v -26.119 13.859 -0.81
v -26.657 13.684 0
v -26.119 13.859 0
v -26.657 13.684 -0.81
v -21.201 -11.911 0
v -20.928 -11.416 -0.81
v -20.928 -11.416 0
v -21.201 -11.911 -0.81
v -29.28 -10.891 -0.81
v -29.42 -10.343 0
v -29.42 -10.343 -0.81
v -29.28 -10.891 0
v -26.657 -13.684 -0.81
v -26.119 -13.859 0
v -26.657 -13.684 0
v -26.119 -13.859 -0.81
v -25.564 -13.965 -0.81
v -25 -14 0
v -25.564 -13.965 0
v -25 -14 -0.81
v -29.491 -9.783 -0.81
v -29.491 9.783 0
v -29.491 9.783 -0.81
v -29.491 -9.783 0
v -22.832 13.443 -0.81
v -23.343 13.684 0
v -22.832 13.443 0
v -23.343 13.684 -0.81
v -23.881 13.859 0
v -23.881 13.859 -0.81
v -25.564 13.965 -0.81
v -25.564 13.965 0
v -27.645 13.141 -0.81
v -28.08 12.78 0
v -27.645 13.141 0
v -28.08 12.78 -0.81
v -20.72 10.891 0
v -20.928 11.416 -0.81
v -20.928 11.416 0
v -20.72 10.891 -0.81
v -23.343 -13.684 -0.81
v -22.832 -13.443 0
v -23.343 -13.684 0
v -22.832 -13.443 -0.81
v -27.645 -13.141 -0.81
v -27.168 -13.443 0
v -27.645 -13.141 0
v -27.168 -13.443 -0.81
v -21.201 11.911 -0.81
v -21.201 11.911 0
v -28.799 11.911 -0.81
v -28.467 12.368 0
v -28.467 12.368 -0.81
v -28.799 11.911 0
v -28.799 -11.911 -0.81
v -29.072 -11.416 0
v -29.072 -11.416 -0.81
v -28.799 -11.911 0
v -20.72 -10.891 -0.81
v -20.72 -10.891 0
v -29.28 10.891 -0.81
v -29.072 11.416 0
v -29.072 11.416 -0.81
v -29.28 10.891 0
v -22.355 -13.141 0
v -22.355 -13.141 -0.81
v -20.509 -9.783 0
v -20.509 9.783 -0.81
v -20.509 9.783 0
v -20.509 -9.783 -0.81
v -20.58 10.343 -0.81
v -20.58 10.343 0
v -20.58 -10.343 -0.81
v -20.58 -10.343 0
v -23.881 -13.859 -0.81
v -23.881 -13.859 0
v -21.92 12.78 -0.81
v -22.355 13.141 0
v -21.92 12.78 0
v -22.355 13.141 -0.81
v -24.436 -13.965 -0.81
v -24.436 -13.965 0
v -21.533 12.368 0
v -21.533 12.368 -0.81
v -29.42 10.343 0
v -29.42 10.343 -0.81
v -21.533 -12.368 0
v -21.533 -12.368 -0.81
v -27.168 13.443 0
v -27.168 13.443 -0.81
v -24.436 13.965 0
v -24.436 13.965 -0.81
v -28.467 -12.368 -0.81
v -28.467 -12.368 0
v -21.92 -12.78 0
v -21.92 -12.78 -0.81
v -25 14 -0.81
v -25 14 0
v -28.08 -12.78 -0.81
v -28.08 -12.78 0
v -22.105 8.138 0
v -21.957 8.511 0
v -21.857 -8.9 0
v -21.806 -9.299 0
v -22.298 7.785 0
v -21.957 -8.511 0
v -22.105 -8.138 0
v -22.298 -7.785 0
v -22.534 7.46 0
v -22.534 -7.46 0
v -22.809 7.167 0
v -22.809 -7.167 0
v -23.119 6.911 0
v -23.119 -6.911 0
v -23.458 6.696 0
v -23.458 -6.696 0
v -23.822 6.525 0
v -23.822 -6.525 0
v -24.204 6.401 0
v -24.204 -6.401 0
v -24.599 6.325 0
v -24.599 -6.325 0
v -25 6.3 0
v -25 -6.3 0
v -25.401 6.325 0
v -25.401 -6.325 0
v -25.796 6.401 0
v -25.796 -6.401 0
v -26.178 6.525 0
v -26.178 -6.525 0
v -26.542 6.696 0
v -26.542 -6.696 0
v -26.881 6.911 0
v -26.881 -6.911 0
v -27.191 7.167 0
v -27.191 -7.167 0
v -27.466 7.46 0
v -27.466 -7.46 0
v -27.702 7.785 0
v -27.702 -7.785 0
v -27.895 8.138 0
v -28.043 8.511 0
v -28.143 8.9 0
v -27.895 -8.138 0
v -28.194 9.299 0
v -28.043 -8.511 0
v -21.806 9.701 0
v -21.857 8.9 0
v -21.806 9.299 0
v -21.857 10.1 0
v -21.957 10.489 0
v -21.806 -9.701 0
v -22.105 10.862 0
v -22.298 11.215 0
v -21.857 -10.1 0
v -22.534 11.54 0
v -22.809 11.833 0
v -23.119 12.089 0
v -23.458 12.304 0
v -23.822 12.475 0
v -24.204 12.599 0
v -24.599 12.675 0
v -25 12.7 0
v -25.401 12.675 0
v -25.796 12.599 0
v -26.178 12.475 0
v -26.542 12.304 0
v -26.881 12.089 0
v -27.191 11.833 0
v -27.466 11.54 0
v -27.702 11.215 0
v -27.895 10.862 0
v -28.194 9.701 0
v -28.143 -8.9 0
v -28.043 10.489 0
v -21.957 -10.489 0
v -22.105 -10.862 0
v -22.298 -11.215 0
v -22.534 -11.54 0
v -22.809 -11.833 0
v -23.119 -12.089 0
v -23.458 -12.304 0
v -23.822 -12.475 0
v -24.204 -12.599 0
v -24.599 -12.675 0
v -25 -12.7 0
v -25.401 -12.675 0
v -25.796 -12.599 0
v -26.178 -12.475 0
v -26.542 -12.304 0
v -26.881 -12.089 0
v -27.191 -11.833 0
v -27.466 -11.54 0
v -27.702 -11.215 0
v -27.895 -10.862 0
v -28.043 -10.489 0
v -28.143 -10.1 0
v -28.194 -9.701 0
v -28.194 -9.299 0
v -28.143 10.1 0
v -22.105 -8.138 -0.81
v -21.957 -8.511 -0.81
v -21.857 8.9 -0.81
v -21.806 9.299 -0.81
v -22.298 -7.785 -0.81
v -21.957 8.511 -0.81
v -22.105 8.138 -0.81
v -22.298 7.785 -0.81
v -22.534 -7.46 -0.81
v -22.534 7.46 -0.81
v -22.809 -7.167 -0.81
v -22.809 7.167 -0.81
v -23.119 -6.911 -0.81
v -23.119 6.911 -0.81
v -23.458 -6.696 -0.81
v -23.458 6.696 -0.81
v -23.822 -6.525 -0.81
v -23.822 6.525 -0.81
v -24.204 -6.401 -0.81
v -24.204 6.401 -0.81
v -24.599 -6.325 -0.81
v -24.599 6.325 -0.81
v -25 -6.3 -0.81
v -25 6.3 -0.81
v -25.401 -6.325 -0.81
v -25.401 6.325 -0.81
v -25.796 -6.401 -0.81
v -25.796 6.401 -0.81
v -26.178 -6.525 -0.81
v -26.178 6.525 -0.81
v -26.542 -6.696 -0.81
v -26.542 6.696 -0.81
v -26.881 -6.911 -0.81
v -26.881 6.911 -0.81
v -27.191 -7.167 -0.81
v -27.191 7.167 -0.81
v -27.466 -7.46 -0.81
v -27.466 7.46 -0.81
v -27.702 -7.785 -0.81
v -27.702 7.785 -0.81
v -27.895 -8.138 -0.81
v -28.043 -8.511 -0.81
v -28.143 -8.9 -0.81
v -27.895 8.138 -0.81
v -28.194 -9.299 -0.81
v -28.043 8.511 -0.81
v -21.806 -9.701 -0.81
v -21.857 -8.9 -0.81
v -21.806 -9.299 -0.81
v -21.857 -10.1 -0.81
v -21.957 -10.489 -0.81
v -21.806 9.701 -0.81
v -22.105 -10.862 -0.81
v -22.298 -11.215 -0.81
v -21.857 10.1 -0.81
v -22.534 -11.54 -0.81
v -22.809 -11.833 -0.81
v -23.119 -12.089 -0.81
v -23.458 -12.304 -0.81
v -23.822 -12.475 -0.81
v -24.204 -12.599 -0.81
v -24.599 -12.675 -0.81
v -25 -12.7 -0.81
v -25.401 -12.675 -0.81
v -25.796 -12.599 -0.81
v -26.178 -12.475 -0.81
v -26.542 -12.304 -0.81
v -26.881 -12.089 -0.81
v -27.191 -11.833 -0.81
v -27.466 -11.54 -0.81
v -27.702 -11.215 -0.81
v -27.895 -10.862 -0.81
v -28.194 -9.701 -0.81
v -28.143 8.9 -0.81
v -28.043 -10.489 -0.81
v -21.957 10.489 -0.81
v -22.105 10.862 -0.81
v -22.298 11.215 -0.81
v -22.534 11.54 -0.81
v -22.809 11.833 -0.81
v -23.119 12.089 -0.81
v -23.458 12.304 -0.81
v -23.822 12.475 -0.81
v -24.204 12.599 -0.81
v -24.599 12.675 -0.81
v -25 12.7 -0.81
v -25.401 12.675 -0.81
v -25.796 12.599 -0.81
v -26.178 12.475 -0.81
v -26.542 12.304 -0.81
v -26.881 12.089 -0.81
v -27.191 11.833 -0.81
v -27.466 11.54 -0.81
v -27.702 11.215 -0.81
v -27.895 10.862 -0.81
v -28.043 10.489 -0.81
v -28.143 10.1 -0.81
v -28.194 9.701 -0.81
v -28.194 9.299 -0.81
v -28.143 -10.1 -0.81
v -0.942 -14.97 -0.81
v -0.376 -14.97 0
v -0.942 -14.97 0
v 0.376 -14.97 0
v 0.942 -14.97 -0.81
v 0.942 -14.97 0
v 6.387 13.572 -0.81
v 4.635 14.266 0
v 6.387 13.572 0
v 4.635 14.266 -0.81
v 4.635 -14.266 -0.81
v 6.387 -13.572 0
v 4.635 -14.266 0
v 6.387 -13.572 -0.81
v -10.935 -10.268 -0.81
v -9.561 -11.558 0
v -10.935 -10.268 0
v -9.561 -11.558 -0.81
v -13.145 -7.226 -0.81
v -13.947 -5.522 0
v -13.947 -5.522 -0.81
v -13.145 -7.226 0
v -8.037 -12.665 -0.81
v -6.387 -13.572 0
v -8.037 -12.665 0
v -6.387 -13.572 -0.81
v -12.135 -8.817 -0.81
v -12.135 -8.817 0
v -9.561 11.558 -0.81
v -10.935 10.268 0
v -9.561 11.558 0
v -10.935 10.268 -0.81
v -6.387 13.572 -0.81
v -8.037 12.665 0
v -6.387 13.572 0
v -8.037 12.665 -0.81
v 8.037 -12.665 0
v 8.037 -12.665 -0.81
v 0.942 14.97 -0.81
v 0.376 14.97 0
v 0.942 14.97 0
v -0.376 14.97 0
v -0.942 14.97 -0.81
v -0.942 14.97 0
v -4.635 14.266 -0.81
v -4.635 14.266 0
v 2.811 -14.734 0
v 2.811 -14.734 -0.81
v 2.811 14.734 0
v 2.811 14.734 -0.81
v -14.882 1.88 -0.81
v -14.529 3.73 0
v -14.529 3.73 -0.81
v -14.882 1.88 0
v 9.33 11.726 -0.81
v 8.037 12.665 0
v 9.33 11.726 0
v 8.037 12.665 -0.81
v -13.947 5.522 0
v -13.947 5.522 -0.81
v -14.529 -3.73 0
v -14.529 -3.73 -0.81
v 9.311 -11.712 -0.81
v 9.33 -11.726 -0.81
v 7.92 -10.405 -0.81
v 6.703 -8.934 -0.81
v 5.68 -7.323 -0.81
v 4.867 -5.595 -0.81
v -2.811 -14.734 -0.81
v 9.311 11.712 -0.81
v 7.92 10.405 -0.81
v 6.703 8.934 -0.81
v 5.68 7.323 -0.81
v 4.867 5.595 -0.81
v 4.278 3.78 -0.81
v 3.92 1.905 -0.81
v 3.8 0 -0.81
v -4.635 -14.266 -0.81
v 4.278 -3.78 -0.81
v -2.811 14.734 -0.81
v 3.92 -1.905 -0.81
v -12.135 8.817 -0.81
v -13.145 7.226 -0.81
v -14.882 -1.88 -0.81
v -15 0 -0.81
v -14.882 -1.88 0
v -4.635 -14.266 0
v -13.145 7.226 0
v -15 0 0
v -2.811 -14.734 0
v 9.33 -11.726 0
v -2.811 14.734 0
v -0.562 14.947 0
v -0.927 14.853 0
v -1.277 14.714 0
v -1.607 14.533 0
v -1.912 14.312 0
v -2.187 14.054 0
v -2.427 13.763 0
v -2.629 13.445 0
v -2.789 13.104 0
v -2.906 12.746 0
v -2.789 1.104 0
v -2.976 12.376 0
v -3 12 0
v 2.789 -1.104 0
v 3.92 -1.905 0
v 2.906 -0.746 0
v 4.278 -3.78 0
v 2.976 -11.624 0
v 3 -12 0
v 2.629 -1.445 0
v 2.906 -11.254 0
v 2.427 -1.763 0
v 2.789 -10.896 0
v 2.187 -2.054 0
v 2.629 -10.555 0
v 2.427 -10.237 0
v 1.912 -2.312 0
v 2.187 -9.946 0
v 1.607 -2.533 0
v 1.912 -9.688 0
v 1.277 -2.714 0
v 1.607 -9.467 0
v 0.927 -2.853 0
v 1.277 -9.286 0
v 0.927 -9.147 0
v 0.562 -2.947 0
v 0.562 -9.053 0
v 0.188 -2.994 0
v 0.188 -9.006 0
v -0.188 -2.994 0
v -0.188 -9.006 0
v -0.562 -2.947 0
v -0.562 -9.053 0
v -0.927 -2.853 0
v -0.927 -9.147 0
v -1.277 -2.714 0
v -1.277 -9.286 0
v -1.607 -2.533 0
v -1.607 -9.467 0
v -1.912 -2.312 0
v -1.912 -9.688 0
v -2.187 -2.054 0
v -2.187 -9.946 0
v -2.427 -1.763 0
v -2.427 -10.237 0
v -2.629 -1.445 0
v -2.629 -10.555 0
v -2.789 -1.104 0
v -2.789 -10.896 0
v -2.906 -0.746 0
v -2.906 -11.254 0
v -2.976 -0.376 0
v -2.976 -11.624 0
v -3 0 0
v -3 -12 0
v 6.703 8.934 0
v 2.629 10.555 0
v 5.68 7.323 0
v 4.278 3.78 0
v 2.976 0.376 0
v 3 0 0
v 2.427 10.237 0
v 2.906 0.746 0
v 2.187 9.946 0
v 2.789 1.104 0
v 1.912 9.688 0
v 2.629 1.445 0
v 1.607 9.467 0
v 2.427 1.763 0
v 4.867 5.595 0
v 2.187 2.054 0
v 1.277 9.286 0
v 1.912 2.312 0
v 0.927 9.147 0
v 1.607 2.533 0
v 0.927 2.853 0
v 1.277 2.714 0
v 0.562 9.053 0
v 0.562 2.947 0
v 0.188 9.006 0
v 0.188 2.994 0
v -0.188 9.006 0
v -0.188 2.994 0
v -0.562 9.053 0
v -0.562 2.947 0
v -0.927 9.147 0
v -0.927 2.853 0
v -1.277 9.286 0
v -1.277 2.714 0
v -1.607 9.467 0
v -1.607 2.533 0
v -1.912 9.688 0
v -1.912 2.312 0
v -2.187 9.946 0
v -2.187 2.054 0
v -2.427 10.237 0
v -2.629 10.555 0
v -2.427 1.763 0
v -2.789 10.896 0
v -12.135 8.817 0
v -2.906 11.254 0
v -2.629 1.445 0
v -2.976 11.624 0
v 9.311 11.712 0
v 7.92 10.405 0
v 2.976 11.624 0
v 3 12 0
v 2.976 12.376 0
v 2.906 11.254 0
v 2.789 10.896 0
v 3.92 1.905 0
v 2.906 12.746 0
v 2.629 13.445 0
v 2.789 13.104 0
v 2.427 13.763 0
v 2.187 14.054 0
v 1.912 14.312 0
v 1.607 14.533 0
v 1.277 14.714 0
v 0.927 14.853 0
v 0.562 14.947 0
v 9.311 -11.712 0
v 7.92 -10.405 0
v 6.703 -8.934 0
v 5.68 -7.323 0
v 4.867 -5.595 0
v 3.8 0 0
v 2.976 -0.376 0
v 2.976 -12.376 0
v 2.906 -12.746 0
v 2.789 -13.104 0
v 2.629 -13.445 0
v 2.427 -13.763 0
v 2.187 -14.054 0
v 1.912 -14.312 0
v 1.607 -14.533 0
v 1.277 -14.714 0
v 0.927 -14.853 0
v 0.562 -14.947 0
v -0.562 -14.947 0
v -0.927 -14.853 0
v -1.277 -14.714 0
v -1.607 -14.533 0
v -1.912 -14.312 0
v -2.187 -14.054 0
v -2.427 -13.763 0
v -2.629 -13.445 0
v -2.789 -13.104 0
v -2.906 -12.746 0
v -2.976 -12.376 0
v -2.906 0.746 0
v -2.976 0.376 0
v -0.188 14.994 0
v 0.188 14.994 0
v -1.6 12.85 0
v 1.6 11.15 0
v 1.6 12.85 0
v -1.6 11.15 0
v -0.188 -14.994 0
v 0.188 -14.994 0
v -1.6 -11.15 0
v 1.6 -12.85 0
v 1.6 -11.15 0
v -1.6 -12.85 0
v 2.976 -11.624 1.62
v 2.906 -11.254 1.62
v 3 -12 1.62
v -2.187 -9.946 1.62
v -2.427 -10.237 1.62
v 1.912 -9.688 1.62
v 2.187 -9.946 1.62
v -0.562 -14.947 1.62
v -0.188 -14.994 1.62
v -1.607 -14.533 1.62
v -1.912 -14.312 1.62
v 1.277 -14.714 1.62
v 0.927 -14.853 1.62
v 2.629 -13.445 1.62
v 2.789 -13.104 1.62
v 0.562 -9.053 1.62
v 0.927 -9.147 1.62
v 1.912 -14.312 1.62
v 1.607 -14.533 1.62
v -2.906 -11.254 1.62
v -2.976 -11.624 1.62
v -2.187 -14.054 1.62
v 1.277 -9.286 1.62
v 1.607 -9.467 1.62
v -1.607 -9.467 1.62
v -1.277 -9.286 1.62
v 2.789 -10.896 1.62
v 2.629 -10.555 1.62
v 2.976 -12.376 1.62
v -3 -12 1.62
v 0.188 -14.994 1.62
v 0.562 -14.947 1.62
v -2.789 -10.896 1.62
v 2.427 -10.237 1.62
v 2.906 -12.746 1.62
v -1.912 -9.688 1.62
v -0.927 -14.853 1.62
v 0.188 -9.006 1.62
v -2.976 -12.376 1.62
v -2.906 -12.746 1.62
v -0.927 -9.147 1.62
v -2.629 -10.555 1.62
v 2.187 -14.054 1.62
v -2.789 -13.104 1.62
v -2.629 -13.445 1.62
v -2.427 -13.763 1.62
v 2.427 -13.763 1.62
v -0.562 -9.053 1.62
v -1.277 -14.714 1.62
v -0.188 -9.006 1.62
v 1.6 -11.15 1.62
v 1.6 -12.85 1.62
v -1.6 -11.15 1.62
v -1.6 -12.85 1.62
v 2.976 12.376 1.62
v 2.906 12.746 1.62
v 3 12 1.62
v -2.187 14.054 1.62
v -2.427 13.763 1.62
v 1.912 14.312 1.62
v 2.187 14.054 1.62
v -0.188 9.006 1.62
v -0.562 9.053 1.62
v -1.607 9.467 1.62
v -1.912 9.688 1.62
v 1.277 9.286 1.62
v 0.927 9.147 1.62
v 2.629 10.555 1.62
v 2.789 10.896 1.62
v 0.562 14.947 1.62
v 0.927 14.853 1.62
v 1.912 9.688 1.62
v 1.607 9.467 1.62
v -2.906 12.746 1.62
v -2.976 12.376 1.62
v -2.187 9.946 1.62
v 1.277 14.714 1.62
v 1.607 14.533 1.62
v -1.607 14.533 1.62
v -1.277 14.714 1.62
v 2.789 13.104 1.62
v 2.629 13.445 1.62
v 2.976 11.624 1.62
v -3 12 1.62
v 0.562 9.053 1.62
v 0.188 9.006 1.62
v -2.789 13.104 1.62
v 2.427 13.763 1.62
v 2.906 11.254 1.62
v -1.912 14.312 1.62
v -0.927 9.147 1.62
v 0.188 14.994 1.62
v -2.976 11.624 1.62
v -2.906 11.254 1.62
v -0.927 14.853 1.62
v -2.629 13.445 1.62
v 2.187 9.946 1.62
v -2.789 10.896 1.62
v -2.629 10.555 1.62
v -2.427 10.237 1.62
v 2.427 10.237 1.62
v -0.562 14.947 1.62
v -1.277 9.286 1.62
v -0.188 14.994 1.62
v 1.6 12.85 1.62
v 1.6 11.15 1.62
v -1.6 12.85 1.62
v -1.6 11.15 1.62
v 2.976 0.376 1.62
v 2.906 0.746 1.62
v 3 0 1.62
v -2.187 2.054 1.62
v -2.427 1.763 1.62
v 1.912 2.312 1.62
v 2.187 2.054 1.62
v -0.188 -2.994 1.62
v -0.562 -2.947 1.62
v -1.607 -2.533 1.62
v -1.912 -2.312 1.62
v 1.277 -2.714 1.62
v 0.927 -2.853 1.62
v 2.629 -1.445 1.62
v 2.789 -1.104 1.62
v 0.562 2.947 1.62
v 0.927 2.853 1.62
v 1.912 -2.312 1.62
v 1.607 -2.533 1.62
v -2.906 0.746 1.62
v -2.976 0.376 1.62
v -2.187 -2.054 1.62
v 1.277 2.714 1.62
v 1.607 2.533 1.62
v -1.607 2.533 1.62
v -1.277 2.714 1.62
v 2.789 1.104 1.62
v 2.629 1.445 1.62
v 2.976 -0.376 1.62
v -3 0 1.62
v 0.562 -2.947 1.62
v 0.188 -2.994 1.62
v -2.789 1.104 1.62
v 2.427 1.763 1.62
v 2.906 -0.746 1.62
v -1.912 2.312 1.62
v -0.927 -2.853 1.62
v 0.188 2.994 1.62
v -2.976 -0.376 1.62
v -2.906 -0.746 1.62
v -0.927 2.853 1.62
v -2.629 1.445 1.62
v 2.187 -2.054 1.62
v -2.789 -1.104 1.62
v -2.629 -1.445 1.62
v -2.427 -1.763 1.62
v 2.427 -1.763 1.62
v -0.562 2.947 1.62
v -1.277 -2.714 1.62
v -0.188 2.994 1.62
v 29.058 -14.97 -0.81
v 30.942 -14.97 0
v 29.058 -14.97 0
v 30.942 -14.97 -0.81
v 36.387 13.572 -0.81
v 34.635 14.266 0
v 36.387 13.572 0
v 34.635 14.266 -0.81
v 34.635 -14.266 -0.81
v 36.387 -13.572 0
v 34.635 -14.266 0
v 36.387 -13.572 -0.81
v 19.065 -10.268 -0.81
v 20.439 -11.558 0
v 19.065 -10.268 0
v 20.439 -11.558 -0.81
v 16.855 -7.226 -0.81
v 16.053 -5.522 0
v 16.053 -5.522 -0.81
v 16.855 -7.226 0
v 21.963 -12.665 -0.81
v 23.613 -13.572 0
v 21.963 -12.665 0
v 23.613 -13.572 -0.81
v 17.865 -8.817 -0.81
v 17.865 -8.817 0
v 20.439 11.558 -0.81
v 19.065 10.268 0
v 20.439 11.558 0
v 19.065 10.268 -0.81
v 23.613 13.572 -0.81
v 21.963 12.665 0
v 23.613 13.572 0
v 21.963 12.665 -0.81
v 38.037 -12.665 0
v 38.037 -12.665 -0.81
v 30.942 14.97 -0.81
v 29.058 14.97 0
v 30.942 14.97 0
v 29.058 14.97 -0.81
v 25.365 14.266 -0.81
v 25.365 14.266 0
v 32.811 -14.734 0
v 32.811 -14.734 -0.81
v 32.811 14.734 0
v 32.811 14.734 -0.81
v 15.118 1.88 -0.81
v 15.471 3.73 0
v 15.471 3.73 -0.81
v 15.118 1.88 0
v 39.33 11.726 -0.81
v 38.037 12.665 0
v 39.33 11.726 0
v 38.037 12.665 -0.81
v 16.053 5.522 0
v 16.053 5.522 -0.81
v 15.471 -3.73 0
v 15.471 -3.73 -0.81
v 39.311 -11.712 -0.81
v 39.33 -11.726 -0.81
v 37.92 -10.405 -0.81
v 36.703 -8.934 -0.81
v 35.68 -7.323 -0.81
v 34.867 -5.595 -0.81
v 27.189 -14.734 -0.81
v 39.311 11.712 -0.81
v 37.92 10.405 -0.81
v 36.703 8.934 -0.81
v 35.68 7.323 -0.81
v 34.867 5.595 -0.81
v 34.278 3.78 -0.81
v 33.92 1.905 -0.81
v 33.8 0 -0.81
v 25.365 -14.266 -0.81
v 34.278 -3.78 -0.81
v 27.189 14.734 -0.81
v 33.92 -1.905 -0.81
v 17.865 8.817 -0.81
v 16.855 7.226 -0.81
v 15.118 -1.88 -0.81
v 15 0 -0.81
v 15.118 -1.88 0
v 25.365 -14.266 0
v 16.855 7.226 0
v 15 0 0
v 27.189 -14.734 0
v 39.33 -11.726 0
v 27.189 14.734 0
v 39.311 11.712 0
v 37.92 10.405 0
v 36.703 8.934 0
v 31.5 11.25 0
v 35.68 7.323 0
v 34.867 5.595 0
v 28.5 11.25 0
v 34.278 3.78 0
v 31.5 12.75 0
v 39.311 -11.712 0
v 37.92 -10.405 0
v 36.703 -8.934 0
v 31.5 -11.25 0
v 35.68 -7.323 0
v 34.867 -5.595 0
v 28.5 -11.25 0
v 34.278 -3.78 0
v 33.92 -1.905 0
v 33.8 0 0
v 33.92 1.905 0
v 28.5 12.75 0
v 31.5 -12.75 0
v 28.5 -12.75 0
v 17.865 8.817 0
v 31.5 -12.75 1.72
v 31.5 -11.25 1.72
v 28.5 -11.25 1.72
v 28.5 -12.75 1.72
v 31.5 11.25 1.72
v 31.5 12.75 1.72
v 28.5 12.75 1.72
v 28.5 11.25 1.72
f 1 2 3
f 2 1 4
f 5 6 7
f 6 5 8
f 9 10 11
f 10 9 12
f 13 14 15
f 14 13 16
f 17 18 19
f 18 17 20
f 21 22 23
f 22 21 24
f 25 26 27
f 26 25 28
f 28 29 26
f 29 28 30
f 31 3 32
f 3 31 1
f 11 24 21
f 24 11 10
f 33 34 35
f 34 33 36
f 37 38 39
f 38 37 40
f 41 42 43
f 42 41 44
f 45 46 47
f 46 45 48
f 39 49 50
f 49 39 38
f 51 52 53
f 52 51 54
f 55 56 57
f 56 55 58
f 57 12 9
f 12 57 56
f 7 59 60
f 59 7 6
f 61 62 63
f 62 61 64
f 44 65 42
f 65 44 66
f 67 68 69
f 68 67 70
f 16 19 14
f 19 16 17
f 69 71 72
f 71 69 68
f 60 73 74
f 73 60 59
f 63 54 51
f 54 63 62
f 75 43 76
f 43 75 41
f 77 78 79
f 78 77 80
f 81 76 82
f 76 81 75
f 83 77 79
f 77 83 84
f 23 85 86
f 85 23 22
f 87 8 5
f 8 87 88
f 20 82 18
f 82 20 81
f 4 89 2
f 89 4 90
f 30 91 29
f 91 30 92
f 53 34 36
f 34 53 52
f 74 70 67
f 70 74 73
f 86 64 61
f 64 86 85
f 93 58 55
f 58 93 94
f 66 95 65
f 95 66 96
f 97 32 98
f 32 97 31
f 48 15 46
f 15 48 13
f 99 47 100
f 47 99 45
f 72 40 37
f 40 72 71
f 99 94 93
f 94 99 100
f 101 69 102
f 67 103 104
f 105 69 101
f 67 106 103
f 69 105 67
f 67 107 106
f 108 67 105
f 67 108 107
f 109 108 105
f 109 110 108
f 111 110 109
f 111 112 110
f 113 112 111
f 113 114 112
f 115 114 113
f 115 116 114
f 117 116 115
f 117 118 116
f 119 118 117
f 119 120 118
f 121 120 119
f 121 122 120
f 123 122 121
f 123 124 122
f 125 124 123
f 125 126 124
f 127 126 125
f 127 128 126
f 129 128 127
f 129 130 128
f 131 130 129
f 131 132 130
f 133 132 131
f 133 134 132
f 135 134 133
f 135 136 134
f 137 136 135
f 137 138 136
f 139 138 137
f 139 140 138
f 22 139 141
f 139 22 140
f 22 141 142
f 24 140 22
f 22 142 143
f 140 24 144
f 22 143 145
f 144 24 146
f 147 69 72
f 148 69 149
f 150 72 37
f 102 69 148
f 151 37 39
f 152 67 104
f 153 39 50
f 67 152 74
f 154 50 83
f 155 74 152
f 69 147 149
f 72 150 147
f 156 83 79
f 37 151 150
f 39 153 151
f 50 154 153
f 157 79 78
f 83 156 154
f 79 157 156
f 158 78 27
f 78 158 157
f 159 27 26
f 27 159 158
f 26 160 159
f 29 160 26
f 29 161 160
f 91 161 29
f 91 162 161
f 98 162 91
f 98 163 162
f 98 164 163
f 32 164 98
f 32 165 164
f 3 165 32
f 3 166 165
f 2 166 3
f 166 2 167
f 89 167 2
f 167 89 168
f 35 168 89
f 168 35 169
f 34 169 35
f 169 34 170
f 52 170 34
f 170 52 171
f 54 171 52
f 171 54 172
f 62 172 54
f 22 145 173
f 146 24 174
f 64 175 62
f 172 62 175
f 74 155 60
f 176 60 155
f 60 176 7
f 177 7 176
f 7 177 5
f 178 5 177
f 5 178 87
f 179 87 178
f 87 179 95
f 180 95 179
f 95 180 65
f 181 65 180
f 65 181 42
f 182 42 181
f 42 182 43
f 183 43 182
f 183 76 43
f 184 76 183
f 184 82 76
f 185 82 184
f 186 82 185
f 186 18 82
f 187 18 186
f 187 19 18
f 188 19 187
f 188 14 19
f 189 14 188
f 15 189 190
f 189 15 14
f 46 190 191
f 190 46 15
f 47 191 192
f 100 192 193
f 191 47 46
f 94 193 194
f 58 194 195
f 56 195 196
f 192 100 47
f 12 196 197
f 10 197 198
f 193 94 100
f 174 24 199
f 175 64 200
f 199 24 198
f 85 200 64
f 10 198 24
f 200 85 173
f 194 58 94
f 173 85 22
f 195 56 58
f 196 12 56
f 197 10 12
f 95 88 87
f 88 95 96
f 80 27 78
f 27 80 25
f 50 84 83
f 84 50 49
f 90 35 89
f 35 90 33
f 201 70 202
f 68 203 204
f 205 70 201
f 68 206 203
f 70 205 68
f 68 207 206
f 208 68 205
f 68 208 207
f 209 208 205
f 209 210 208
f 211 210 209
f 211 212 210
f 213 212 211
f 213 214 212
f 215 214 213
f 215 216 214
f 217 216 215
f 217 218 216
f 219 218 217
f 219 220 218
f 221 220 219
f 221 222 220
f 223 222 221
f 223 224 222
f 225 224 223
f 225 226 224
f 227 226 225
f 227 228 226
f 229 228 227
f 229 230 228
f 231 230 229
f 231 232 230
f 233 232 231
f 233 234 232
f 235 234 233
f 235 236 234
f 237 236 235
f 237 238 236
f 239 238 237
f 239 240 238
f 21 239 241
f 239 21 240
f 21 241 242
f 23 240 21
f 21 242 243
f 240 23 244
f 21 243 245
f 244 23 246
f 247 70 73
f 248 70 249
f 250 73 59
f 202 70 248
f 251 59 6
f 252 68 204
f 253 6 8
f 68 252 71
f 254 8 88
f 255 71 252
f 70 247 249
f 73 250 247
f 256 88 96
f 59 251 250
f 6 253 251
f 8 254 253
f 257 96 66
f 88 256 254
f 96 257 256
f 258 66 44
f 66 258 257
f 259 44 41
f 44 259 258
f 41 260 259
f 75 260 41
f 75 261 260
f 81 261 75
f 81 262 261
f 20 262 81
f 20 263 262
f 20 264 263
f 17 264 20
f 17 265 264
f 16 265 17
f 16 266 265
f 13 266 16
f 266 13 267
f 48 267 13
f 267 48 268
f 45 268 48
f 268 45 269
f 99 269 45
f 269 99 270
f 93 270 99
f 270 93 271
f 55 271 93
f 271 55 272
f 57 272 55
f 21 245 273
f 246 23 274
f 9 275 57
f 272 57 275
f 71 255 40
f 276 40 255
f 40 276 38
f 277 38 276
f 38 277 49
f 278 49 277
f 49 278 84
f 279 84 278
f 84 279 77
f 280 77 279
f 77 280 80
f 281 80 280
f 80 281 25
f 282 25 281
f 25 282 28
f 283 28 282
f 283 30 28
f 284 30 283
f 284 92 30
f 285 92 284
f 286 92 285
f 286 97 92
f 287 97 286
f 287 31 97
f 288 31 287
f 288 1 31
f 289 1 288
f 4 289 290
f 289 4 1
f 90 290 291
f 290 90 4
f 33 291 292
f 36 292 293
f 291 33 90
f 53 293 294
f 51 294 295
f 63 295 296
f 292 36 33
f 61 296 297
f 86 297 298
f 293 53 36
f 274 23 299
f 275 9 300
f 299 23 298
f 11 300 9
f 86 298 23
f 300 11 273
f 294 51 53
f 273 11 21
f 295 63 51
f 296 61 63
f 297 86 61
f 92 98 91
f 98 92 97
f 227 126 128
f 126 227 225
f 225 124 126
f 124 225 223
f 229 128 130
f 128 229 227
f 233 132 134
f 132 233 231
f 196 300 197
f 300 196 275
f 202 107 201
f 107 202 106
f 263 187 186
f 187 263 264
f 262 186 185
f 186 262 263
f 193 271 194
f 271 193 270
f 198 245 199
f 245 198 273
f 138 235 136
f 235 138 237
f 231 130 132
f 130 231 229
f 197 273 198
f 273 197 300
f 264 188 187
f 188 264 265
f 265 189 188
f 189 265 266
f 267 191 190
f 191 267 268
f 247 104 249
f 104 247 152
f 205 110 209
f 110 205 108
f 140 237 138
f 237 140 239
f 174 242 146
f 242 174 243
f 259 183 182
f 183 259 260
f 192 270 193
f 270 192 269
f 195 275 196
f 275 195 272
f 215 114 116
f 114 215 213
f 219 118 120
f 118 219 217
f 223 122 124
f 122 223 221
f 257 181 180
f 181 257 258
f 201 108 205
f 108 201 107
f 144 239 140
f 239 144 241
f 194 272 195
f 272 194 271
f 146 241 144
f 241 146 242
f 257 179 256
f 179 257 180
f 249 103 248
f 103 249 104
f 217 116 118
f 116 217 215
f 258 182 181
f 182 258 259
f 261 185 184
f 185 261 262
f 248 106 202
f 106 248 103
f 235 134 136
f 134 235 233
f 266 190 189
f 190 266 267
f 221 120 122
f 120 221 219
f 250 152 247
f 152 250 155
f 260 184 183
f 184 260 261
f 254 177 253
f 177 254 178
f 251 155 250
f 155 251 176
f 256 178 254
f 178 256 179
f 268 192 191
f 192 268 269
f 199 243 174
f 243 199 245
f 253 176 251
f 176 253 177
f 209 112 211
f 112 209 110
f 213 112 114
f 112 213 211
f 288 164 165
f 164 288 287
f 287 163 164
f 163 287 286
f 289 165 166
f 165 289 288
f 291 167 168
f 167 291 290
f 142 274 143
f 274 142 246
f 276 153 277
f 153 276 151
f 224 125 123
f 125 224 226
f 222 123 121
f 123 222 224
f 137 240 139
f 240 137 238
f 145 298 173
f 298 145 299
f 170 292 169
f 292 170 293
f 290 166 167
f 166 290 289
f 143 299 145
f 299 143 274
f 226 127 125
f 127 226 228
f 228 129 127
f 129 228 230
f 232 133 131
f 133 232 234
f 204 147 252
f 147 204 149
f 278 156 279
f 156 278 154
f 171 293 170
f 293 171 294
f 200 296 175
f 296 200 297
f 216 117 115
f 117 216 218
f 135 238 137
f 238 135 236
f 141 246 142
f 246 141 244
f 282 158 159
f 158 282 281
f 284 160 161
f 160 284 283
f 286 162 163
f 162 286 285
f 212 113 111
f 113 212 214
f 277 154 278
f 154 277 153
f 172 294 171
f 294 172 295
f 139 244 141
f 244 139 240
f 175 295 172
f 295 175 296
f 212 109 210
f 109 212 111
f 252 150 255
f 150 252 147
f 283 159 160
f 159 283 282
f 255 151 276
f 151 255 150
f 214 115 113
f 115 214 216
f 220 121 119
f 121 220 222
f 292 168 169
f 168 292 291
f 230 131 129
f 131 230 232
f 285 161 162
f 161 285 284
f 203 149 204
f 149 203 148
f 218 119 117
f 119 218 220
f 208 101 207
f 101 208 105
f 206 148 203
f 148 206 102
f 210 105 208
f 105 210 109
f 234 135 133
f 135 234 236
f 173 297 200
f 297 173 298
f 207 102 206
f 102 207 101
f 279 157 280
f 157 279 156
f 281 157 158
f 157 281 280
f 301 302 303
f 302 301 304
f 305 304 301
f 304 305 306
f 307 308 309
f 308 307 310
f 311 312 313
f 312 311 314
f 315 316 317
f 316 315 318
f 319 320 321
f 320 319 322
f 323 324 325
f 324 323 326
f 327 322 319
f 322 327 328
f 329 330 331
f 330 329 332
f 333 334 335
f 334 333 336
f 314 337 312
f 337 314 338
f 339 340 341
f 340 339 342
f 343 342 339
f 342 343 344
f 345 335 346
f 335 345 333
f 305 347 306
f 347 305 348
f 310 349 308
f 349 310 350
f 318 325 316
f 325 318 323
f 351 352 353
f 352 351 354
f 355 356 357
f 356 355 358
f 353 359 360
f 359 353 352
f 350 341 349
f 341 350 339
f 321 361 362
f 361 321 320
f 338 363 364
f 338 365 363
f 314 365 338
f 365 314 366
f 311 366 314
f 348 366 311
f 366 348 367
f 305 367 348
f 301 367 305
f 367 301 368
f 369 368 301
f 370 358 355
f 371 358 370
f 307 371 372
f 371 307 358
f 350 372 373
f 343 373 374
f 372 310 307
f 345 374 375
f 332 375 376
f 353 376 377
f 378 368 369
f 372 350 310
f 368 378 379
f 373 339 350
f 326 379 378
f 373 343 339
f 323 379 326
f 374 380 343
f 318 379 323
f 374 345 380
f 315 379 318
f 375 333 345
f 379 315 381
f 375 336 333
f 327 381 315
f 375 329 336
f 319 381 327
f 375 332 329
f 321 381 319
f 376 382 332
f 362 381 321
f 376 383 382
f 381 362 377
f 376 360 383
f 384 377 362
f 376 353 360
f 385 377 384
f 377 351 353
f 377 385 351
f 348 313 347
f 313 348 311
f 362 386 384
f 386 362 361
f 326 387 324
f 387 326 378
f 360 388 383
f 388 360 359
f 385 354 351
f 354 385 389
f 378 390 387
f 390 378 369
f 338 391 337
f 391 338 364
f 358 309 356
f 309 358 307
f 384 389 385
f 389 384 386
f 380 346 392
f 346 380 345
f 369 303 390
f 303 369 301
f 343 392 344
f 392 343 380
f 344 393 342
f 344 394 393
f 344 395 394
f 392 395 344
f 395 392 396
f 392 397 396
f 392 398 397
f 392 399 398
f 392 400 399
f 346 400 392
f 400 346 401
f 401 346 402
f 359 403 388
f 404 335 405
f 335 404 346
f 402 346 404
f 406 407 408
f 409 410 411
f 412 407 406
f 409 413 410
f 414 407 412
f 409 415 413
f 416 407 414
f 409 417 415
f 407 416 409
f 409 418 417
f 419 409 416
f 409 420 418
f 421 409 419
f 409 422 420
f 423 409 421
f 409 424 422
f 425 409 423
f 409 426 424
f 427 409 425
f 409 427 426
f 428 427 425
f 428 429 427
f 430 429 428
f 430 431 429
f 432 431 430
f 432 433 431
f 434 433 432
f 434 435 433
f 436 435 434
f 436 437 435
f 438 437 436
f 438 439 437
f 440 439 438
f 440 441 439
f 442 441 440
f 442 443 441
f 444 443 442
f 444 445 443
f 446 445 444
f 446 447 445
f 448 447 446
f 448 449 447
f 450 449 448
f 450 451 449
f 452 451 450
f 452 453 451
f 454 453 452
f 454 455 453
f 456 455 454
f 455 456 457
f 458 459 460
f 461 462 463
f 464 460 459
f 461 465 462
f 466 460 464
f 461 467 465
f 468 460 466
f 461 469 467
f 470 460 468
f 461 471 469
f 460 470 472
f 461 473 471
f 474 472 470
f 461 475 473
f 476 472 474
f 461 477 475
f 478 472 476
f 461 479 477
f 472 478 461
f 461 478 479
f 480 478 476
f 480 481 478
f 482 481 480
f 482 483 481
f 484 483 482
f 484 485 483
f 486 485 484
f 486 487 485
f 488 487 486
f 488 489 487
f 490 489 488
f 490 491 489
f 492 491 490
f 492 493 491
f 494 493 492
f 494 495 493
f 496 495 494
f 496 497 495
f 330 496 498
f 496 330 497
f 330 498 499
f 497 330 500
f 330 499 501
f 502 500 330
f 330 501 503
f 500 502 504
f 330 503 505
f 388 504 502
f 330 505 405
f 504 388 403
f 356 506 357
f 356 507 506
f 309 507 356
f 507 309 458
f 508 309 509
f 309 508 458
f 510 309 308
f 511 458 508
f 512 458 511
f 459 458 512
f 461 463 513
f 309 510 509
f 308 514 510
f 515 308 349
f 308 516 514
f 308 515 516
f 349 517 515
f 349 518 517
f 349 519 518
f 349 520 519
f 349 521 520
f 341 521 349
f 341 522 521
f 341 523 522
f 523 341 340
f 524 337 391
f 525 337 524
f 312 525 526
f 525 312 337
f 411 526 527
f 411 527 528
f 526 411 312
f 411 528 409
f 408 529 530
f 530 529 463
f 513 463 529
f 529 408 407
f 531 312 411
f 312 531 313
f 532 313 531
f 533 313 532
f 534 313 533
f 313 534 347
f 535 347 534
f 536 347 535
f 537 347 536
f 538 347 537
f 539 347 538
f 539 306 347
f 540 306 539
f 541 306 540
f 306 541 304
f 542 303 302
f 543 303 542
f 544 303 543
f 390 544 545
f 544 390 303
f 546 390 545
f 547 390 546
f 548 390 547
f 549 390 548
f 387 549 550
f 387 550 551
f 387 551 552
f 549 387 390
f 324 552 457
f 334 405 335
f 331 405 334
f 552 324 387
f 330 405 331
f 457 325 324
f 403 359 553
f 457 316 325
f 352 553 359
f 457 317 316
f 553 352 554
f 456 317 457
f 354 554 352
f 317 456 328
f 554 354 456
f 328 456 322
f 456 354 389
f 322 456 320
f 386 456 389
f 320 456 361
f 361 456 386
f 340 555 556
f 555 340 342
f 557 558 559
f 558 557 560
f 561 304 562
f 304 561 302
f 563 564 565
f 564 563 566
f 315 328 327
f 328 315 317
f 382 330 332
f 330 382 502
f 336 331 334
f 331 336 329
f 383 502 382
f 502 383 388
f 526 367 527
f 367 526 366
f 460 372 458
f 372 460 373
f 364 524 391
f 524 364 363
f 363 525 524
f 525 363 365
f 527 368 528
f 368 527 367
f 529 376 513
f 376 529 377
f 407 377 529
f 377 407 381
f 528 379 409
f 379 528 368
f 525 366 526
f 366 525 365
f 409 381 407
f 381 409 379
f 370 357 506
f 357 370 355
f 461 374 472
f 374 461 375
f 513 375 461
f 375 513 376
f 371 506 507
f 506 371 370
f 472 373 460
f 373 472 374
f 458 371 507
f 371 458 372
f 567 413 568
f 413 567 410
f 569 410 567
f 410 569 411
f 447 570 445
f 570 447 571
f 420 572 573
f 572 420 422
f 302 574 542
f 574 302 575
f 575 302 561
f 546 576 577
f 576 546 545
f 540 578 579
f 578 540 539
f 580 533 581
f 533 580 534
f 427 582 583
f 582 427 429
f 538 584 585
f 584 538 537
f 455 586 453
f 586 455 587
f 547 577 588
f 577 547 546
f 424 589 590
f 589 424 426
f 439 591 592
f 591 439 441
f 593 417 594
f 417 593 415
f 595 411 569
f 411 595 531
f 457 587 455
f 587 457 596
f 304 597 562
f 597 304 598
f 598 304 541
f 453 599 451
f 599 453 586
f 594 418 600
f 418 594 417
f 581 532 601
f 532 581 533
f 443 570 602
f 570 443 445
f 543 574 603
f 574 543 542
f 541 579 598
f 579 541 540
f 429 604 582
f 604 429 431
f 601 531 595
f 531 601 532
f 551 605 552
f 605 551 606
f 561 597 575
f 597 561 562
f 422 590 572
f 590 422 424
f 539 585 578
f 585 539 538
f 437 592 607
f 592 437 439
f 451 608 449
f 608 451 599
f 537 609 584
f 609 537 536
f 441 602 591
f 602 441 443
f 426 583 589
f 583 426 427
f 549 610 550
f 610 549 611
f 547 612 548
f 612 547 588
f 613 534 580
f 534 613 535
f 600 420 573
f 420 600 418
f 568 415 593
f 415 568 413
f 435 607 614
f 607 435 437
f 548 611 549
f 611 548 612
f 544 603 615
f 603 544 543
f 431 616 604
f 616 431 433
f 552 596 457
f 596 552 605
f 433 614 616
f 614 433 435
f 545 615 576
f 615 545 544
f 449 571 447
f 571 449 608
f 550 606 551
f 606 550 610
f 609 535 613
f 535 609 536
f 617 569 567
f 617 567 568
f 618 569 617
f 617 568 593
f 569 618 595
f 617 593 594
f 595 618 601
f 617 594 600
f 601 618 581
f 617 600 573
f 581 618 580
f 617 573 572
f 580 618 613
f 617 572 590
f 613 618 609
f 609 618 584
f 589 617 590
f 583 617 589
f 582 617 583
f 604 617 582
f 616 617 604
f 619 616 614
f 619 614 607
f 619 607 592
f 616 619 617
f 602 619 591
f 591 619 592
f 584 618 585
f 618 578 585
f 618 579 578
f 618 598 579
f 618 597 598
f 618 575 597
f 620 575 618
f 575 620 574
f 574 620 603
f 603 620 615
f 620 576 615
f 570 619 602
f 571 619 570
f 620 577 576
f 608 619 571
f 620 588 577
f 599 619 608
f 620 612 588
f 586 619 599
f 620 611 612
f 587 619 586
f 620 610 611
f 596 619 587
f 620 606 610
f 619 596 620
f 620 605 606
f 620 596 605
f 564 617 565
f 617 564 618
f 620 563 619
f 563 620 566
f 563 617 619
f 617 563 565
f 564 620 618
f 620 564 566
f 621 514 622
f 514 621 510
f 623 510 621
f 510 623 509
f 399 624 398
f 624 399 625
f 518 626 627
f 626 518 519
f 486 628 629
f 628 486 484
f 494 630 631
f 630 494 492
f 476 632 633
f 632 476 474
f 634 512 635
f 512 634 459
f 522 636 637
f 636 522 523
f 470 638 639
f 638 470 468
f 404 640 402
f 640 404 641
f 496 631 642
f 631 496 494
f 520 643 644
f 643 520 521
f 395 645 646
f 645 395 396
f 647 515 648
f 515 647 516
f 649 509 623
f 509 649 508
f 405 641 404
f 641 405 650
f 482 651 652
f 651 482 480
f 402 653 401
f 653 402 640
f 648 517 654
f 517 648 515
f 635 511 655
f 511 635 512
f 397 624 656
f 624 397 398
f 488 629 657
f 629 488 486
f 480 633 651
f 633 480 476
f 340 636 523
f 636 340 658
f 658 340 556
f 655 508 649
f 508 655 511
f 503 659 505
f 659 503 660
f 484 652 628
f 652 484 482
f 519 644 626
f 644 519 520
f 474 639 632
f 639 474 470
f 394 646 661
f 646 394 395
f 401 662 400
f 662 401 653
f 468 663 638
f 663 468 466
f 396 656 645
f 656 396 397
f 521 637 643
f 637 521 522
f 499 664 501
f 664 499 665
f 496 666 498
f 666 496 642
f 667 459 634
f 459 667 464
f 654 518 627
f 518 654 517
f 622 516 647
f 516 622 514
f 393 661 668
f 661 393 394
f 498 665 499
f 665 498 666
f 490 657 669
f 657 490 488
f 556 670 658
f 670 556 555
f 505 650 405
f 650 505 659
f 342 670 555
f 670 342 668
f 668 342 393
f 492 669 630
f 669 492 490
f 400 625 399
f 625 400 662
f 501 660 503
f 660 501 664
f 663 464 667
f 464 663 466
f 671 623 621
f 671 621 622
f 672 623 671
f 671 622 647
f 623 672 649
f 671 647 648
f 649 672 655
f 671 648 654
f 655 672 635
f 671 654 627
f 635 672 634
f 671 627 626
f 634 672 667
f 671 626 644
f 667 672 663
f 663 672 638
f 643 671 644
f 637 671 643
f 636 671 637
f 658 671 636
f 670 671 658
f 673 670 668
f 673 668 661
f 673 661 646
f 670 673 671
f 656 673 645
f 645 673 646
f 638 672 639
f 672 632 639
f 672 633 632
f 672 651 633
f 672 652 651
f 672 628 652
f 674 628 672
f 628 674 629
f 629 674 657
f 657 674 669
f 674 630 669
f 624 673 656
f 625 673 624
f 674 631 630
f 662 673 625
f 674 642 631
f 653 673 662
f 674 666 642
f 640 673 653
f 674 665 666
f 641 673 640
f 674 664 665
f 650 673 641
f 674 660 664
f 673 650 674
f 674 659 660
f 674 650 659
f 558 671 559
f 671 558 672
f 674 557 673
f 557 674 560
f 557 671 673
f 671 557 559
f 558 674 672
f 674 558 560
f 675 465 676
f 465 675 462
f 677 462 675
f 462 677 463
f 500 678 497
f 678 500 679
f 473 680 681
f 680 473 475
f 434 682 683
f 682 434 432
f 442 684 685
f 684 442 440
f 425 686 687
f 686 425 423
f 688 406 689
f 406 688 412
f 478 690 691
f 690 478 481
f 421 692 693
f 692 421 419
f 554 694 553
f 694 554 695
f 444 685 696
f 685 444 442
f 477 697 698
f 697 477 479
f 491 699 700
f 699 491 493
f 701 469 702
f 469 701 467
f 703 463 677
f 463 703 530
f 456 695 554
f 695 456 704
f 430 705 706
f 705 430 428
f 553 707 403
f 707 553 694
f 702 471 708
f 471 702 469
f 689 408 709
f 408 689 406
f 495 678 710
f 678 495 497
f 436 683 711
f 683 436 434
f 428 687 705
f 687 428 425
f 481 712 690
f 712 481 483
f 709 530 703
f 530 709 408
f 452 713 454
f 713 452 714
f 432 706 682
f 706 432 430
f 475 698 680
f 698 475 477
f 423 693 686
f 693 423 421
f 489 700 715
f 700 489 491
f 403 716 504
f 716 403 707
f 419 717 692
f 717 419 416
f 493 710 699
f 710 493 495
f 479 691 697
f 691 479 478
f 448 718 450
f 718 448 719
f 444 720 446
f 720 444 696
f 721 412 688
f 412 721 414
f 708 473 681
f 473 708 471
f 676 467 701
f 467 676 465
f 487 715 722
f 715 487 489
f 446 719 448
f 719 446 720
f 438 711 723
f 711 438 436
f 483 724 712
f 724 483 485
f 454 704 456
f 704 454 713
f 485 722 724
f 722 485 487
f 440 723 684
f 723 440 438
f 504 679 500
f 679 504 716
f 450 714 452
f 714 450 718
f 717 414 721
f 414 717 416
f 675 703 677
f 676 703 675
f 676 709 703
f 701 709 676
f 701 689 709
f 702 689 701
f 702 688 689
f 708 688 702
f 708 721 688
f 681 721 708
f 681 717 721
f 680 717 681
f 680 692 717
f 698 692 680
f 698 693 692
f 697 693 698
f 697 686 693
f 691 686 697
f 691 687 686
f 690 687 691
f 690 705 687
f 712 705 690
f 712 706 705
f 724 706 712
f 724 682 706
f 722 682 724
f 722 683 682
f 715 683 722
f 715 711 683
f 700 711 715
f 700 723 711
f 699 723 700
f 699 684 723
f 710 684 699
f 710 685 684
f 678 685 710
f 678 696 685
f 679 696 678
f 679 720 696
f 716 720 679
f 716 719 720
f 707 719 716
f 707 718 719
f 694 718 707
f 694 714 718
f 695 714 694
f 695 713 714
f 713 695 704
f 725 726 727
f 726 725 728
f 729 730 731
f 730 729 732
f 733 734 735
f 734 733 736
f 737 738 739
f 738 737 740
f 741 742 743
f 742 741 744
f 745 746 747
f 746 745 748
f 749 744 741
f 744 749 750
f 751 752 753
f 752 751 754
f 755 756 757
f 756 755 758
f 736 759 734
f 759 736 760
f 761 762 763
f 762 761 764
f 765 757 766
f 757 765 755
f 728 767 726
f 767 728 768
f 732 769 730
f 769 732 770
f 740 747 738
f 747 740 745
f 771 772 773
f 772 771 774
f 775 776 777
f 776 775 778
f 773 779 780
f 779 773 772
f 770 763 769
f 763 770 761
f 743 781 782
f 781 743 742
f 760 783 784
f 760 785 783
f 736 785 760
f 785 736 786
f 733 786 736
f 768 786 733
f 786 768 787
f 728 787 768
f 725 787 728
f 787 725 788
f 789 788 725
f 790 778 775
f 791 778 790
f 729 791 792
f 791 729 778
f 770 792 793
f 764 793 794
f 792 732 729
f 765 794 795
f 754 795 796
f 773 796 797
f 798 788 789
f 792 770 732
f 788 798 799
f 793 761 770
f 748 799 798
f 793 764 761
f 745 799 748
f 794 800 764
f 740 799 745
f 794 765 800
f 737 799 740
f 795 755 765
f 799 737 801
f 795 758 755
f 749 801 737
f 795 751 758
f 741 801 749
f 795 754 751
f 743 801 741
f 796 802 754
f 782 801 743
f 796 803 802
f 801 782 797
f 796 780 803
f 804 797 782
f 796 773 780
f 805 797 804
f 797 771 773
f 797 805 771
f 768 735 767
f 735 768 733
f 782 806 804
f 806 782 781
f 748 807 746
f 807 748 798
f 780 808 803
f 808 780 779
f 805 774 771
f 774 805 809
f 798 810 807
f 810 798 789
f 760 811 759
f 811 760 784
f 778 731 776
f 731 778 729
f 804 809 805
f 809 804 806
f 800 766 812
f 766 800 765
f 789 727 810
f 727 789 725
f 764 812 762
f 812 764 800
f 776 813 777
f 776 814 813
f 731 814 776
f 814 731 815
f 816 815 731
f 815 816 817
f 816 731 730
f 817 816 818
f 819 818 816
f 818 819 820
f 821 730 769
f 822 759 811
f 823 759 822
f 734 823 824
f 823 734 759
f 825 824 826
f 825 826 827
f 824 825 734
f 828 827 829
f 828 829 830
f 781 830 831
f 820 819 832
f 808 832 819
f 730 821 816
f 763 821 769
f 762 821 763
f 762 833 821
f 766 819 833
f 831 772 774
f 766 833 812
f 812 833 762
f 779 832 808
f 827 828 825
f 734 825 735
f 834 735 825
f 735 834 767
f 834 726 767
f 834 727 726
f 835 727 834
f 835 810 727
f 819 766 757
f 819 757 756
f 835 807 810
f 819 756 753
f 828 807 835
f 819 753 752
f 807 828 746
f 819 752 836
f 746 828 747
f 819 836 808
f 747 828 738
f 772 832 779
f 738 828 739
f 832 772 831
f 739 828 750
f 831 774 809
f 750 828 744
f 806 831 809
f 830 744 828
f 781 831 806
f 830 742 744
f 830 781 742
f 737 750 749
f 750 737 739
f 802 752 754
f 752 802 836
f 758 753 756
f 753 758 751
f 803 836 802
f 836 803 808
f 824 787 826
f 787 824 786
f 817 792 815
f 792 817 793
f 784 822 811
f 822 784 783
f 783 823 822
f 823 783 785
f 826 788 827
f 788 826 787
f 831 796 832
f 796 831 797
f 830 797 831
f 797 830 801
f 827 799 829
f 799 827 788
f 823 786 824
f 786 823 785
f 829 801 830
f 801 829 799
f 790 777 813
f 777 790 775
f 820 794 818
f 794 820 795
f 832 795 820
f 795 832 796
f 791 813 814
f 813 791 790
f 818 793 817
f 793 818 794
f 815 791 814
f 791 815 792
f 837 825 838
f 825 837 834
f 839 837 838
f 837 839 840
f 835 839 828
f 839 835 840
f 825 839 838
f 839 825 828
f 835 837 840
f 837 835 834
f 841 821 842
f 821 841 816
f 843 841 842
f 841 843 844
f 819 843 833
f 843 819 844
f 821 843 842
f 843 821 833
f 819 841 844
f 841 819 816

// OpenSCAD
//// Number of fragments
$fn=50;

radius=15;
height=0.81;
distance=4;
wall=0.81;
corr=0.2;
axish=5;
axisr=3;
height=0.81;

translate([-radius-10,0,0])connector();
translate([0,0,0])joint_bottom();
translate([radius+15,0,0])joint_top();

module joint_bottom() {
  difference() {
    translate([0,0,-height/2])cylinder(r=radius,h=height,center=true);
    translate([+radius+distance,0,-height/2])cylinder(r=radius+corr,h=height+corr,center=true);
  }
  translate([0,0,height])cylinder(r=axisr,h=2*height,center=true);

  translate([0,-radius+axisr,0])difference() {
    translate([0,0,height])cylinder(r=axisr,h=height*2,center=true);
    translate([0,0,height])cube([axisr+corr,axisr/2+corr,height*2+corr],center=true);
  }

  translate([0,+radius-axisr,0])difference() {
    translate([0,0,height])cylinder(r=axisr,h=height*2,center=true);
    translate([0,0,height])cube([axisr+corr,axisr/2+corr,height*2+corr],center=true);
  }
}

module joint_top() {
  difference() {
    translate([0,0,-height/2])cylinder(r=radius,h=height,center=true);
    translate([+radius+distance,0,-height/2])cylinder(r=radius+corr,h=height+corr,center=true);
  }
  translate([0,-radius+axisr,height])cube([axisr,axisr/2,height*2+corr],center=true);
  translate([0,+radius-axisr,height])cube([axisr,axisr/2,height*2+corr],center=true);
}

module connector() {
  translate([0,-radius/2-distance/2,-height/2])rotate([0,0,90])difference() {
    hull() {
      cylinder(r=3/2*axisr,h=height,center=true);
      translate([radius+distance,0,0])cylinder(r=3/2*axisr,h=height,center=true);
    }
    cylinder(r=axisr+corr,h=height+corr,center=true);
    translate([radius+distance,0,0])cylinder(r=axisr+corr,h=height+corr,center=true);
  }
}
